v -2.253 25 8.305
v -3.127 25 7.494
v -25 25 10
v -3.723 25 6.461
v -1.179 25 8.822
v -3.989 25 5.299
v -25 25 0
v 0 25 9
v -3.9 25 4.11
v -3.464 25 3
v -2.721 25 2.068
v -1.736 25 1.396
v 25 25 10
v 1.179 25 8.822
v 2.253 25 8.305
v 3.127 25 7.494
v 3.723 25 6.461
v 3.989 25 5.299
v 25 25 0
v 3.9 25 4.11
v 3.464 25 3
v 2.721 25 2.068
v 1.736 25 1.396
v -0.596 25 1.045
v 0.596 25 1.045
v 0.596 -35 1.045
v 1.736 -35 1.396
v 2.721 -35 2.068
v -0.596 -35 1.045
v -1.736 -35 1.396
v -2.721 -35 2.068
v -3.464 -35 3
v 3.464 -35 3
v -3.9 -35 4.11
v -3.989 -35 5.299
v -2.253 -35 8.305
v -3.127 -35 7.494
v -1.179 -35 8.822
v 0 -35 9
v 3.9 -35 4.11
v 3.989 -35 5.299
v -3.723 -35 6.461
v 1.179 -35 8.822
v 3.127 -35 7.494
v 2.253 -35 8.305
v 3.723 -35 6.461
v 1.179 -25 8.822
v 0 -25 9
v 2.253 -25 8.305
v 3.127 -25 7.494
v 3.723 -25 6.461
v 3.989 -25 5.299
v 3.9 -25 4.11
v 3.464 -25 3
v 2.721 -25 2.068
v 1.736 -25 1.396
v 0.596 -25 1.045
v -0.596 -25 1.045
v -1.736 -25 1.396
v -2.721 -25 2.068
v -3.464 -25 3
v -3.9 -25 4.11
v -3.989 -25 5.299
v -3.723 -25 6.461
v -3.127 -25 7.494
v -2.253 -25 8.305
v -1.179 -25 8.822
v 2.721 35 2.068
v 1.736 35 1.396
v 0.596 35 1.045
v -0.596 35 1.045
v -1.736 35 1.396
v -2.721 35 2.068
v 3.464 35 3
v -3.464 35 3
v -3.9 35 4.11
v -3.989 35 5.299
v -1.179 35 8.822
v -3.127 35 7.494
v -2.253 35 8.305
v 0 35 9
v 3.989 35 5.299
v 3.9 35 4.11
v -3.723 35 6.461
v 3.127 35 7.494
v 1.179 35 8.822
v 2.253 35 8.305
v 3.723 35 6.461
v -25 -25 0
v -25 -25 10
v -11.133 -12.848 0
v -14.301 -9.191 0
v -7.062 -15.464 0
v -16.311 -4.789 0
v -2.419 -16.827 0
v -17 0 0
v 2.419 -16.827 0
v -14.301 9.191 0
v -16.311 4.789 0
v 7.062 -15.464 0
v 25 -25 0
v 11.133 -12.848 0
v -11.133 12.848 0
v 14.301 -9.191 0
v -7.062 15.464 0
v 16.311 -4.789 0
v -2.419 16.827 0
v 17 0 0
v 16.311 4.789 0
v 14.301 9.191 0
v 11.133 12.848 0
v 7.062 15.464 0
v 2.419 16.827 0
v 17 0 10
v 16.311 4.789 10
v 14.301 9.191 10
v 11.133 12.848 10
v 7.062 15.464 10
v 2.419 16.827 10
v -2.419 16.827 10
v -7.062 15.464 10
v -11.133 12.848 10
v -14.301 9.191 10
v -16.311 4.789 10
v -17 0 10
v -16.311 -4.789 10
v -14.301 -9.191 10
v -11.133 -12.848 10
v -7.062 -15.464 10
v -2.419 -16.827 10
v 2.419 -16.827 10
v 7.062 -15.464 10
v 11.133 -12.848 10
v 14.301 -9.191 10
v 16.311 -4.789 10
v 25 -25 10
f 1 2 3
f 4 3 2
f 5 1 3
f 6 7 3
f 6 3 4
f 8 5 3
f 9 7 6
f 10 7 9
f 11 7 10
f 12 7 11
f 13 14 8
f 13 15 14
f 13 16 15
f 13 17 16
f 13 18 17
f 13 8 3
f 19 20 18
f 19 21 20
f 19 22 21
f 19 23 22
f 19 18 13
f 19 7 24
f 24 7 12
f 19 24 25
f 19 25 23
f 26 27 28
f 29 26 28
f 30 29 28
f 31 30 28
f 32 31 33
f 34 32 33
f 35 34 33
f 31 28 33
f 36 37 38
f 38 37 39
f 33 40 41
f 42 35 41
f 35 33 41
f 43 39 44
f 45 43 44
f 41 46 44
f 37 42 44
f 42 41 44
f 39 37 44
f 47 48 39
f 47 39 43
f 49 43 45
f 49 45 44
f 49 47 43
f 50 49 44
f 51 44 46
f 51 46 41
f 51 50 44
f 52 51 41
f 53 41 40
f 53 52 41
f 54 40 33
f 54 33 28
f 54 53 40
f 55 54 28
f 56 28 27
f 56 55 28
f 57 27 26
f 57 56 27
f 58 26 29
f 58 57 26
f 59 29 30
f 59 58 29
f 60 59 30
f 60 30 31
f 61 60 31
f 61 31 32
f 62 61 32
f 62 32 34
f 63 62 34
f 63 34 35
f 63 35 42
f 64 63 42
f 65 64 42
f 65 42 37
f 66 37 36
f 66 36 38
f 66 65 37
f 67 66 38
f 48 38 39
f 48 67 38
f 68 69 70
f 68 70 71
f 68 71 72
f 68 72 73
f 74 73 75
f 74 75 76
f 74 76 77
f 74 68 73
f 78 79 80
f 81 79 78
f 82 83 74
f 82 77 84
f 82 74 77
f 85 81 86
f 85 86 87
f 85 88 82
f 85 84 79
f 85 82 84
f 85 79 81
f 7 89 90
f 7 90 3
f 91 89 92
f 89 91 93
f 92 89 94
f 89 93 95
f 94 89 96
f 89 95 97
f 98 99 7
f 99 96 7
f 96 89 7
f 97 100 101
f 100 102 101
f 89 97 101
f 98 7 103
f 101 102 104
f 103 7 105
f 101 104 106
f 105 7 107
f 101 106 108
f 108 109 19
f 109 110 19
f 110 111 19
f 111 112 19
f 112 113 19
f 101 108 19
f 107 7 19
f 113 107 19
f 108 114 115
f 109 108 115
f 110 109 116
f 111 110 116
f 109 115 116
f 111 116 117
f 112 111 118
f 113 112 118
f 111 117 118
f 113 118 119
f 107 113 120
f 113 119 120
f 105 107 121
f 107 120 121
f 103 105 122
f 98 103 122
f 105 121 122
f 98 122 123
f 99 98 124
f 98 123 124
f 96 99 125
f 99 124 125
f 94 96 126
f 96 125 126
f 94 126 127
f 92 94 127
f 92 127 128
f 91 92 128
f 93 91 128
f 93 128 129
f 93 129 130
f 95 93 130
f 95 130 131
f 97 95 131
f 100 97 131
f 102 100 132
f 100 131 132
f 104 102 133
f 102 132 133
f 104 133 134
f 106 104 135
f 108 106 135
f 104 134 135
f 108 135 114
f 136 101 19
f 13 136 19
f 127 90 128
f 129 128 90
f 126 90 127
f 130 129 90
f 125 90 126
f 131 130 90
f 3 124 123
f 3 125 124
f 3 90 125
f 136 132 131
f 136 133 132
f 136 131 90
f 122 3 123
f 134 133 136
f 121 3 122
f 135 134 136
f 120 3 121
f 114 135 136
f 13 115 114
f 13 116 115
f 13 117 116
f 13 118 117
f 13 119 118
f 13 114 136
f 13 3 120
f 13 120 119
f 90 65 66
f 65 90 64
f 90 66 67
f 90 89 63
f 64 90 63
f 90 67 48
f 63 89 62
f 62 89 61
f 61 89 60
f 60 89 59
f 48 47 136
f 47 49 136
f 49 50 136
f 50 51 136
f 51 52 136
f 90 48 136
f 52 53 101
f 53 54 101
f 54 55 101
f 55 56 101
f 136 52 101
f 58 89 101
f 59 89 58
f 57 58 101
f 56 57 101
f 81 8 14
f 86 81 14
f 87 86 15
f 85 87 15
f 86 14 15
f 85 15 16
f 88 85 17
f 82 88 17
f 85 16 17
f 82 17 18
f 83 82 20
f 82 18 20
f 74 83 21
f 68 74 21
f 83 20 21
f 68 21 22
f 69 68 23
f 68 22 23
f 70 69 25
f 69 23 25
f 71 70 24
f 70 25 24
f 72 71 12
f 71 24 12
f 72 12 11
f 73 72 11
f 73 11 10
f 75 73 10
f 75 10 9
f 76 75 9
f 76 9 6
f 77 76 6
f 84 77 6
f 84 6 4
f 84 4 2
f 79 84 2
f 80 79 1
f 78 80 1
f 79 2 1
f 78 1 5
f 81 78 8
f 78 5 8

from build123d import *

# Parameters (mm, degrees)
SKETCH1_W           = 50
SKETCH1_H           = 50
BOSS_EXTRUDE1_DEPTH = 10
SKETCH2_R           = 17
CUT_EXTRUDE1_DEPTH  = 10
SKETCH3_R           = 4
BOSS_EXTRUDE2_DEPTH = 10


with BuildPart() as part:
    # Sketch1 → Boss-Extrude1 (new body)
    with BuildSketch(Plane.XY):
        Rectangle(SKETCH1_W, SKETCH1_H)
    extrude(amount=BOSS_EXTRUDE1_DEPTH)

    # Sketch2 → Cut-Extrude1 (cut)
    with BuildSketch(Plane.XY.offset(10)):
        Circle(SKETCH2_R)
    extrude(amount=-CUT_EXTRUDE1_DEPTH, mode=Mode.SUBTRACT)

    # Sketch3 → Boss-Extrude2 (add)
    with BuildSketch(Plane(origin=(0, 25, 0), x_dir=(1, 0, 0), z_dir=(0, 1, 0))):
        with Locations(Location((0, -5, 0), (0, 0, 270))):
            Circle(SKETCH3_R)
    boss_extrude2 = extrude(amount=BOSS_EXTRUDE2_DEPTH)

    # Mirror1: Boss-Extrude2 across plane
    add(boss_extrude2.mirror(Plane.ZX))


solid = part.part
